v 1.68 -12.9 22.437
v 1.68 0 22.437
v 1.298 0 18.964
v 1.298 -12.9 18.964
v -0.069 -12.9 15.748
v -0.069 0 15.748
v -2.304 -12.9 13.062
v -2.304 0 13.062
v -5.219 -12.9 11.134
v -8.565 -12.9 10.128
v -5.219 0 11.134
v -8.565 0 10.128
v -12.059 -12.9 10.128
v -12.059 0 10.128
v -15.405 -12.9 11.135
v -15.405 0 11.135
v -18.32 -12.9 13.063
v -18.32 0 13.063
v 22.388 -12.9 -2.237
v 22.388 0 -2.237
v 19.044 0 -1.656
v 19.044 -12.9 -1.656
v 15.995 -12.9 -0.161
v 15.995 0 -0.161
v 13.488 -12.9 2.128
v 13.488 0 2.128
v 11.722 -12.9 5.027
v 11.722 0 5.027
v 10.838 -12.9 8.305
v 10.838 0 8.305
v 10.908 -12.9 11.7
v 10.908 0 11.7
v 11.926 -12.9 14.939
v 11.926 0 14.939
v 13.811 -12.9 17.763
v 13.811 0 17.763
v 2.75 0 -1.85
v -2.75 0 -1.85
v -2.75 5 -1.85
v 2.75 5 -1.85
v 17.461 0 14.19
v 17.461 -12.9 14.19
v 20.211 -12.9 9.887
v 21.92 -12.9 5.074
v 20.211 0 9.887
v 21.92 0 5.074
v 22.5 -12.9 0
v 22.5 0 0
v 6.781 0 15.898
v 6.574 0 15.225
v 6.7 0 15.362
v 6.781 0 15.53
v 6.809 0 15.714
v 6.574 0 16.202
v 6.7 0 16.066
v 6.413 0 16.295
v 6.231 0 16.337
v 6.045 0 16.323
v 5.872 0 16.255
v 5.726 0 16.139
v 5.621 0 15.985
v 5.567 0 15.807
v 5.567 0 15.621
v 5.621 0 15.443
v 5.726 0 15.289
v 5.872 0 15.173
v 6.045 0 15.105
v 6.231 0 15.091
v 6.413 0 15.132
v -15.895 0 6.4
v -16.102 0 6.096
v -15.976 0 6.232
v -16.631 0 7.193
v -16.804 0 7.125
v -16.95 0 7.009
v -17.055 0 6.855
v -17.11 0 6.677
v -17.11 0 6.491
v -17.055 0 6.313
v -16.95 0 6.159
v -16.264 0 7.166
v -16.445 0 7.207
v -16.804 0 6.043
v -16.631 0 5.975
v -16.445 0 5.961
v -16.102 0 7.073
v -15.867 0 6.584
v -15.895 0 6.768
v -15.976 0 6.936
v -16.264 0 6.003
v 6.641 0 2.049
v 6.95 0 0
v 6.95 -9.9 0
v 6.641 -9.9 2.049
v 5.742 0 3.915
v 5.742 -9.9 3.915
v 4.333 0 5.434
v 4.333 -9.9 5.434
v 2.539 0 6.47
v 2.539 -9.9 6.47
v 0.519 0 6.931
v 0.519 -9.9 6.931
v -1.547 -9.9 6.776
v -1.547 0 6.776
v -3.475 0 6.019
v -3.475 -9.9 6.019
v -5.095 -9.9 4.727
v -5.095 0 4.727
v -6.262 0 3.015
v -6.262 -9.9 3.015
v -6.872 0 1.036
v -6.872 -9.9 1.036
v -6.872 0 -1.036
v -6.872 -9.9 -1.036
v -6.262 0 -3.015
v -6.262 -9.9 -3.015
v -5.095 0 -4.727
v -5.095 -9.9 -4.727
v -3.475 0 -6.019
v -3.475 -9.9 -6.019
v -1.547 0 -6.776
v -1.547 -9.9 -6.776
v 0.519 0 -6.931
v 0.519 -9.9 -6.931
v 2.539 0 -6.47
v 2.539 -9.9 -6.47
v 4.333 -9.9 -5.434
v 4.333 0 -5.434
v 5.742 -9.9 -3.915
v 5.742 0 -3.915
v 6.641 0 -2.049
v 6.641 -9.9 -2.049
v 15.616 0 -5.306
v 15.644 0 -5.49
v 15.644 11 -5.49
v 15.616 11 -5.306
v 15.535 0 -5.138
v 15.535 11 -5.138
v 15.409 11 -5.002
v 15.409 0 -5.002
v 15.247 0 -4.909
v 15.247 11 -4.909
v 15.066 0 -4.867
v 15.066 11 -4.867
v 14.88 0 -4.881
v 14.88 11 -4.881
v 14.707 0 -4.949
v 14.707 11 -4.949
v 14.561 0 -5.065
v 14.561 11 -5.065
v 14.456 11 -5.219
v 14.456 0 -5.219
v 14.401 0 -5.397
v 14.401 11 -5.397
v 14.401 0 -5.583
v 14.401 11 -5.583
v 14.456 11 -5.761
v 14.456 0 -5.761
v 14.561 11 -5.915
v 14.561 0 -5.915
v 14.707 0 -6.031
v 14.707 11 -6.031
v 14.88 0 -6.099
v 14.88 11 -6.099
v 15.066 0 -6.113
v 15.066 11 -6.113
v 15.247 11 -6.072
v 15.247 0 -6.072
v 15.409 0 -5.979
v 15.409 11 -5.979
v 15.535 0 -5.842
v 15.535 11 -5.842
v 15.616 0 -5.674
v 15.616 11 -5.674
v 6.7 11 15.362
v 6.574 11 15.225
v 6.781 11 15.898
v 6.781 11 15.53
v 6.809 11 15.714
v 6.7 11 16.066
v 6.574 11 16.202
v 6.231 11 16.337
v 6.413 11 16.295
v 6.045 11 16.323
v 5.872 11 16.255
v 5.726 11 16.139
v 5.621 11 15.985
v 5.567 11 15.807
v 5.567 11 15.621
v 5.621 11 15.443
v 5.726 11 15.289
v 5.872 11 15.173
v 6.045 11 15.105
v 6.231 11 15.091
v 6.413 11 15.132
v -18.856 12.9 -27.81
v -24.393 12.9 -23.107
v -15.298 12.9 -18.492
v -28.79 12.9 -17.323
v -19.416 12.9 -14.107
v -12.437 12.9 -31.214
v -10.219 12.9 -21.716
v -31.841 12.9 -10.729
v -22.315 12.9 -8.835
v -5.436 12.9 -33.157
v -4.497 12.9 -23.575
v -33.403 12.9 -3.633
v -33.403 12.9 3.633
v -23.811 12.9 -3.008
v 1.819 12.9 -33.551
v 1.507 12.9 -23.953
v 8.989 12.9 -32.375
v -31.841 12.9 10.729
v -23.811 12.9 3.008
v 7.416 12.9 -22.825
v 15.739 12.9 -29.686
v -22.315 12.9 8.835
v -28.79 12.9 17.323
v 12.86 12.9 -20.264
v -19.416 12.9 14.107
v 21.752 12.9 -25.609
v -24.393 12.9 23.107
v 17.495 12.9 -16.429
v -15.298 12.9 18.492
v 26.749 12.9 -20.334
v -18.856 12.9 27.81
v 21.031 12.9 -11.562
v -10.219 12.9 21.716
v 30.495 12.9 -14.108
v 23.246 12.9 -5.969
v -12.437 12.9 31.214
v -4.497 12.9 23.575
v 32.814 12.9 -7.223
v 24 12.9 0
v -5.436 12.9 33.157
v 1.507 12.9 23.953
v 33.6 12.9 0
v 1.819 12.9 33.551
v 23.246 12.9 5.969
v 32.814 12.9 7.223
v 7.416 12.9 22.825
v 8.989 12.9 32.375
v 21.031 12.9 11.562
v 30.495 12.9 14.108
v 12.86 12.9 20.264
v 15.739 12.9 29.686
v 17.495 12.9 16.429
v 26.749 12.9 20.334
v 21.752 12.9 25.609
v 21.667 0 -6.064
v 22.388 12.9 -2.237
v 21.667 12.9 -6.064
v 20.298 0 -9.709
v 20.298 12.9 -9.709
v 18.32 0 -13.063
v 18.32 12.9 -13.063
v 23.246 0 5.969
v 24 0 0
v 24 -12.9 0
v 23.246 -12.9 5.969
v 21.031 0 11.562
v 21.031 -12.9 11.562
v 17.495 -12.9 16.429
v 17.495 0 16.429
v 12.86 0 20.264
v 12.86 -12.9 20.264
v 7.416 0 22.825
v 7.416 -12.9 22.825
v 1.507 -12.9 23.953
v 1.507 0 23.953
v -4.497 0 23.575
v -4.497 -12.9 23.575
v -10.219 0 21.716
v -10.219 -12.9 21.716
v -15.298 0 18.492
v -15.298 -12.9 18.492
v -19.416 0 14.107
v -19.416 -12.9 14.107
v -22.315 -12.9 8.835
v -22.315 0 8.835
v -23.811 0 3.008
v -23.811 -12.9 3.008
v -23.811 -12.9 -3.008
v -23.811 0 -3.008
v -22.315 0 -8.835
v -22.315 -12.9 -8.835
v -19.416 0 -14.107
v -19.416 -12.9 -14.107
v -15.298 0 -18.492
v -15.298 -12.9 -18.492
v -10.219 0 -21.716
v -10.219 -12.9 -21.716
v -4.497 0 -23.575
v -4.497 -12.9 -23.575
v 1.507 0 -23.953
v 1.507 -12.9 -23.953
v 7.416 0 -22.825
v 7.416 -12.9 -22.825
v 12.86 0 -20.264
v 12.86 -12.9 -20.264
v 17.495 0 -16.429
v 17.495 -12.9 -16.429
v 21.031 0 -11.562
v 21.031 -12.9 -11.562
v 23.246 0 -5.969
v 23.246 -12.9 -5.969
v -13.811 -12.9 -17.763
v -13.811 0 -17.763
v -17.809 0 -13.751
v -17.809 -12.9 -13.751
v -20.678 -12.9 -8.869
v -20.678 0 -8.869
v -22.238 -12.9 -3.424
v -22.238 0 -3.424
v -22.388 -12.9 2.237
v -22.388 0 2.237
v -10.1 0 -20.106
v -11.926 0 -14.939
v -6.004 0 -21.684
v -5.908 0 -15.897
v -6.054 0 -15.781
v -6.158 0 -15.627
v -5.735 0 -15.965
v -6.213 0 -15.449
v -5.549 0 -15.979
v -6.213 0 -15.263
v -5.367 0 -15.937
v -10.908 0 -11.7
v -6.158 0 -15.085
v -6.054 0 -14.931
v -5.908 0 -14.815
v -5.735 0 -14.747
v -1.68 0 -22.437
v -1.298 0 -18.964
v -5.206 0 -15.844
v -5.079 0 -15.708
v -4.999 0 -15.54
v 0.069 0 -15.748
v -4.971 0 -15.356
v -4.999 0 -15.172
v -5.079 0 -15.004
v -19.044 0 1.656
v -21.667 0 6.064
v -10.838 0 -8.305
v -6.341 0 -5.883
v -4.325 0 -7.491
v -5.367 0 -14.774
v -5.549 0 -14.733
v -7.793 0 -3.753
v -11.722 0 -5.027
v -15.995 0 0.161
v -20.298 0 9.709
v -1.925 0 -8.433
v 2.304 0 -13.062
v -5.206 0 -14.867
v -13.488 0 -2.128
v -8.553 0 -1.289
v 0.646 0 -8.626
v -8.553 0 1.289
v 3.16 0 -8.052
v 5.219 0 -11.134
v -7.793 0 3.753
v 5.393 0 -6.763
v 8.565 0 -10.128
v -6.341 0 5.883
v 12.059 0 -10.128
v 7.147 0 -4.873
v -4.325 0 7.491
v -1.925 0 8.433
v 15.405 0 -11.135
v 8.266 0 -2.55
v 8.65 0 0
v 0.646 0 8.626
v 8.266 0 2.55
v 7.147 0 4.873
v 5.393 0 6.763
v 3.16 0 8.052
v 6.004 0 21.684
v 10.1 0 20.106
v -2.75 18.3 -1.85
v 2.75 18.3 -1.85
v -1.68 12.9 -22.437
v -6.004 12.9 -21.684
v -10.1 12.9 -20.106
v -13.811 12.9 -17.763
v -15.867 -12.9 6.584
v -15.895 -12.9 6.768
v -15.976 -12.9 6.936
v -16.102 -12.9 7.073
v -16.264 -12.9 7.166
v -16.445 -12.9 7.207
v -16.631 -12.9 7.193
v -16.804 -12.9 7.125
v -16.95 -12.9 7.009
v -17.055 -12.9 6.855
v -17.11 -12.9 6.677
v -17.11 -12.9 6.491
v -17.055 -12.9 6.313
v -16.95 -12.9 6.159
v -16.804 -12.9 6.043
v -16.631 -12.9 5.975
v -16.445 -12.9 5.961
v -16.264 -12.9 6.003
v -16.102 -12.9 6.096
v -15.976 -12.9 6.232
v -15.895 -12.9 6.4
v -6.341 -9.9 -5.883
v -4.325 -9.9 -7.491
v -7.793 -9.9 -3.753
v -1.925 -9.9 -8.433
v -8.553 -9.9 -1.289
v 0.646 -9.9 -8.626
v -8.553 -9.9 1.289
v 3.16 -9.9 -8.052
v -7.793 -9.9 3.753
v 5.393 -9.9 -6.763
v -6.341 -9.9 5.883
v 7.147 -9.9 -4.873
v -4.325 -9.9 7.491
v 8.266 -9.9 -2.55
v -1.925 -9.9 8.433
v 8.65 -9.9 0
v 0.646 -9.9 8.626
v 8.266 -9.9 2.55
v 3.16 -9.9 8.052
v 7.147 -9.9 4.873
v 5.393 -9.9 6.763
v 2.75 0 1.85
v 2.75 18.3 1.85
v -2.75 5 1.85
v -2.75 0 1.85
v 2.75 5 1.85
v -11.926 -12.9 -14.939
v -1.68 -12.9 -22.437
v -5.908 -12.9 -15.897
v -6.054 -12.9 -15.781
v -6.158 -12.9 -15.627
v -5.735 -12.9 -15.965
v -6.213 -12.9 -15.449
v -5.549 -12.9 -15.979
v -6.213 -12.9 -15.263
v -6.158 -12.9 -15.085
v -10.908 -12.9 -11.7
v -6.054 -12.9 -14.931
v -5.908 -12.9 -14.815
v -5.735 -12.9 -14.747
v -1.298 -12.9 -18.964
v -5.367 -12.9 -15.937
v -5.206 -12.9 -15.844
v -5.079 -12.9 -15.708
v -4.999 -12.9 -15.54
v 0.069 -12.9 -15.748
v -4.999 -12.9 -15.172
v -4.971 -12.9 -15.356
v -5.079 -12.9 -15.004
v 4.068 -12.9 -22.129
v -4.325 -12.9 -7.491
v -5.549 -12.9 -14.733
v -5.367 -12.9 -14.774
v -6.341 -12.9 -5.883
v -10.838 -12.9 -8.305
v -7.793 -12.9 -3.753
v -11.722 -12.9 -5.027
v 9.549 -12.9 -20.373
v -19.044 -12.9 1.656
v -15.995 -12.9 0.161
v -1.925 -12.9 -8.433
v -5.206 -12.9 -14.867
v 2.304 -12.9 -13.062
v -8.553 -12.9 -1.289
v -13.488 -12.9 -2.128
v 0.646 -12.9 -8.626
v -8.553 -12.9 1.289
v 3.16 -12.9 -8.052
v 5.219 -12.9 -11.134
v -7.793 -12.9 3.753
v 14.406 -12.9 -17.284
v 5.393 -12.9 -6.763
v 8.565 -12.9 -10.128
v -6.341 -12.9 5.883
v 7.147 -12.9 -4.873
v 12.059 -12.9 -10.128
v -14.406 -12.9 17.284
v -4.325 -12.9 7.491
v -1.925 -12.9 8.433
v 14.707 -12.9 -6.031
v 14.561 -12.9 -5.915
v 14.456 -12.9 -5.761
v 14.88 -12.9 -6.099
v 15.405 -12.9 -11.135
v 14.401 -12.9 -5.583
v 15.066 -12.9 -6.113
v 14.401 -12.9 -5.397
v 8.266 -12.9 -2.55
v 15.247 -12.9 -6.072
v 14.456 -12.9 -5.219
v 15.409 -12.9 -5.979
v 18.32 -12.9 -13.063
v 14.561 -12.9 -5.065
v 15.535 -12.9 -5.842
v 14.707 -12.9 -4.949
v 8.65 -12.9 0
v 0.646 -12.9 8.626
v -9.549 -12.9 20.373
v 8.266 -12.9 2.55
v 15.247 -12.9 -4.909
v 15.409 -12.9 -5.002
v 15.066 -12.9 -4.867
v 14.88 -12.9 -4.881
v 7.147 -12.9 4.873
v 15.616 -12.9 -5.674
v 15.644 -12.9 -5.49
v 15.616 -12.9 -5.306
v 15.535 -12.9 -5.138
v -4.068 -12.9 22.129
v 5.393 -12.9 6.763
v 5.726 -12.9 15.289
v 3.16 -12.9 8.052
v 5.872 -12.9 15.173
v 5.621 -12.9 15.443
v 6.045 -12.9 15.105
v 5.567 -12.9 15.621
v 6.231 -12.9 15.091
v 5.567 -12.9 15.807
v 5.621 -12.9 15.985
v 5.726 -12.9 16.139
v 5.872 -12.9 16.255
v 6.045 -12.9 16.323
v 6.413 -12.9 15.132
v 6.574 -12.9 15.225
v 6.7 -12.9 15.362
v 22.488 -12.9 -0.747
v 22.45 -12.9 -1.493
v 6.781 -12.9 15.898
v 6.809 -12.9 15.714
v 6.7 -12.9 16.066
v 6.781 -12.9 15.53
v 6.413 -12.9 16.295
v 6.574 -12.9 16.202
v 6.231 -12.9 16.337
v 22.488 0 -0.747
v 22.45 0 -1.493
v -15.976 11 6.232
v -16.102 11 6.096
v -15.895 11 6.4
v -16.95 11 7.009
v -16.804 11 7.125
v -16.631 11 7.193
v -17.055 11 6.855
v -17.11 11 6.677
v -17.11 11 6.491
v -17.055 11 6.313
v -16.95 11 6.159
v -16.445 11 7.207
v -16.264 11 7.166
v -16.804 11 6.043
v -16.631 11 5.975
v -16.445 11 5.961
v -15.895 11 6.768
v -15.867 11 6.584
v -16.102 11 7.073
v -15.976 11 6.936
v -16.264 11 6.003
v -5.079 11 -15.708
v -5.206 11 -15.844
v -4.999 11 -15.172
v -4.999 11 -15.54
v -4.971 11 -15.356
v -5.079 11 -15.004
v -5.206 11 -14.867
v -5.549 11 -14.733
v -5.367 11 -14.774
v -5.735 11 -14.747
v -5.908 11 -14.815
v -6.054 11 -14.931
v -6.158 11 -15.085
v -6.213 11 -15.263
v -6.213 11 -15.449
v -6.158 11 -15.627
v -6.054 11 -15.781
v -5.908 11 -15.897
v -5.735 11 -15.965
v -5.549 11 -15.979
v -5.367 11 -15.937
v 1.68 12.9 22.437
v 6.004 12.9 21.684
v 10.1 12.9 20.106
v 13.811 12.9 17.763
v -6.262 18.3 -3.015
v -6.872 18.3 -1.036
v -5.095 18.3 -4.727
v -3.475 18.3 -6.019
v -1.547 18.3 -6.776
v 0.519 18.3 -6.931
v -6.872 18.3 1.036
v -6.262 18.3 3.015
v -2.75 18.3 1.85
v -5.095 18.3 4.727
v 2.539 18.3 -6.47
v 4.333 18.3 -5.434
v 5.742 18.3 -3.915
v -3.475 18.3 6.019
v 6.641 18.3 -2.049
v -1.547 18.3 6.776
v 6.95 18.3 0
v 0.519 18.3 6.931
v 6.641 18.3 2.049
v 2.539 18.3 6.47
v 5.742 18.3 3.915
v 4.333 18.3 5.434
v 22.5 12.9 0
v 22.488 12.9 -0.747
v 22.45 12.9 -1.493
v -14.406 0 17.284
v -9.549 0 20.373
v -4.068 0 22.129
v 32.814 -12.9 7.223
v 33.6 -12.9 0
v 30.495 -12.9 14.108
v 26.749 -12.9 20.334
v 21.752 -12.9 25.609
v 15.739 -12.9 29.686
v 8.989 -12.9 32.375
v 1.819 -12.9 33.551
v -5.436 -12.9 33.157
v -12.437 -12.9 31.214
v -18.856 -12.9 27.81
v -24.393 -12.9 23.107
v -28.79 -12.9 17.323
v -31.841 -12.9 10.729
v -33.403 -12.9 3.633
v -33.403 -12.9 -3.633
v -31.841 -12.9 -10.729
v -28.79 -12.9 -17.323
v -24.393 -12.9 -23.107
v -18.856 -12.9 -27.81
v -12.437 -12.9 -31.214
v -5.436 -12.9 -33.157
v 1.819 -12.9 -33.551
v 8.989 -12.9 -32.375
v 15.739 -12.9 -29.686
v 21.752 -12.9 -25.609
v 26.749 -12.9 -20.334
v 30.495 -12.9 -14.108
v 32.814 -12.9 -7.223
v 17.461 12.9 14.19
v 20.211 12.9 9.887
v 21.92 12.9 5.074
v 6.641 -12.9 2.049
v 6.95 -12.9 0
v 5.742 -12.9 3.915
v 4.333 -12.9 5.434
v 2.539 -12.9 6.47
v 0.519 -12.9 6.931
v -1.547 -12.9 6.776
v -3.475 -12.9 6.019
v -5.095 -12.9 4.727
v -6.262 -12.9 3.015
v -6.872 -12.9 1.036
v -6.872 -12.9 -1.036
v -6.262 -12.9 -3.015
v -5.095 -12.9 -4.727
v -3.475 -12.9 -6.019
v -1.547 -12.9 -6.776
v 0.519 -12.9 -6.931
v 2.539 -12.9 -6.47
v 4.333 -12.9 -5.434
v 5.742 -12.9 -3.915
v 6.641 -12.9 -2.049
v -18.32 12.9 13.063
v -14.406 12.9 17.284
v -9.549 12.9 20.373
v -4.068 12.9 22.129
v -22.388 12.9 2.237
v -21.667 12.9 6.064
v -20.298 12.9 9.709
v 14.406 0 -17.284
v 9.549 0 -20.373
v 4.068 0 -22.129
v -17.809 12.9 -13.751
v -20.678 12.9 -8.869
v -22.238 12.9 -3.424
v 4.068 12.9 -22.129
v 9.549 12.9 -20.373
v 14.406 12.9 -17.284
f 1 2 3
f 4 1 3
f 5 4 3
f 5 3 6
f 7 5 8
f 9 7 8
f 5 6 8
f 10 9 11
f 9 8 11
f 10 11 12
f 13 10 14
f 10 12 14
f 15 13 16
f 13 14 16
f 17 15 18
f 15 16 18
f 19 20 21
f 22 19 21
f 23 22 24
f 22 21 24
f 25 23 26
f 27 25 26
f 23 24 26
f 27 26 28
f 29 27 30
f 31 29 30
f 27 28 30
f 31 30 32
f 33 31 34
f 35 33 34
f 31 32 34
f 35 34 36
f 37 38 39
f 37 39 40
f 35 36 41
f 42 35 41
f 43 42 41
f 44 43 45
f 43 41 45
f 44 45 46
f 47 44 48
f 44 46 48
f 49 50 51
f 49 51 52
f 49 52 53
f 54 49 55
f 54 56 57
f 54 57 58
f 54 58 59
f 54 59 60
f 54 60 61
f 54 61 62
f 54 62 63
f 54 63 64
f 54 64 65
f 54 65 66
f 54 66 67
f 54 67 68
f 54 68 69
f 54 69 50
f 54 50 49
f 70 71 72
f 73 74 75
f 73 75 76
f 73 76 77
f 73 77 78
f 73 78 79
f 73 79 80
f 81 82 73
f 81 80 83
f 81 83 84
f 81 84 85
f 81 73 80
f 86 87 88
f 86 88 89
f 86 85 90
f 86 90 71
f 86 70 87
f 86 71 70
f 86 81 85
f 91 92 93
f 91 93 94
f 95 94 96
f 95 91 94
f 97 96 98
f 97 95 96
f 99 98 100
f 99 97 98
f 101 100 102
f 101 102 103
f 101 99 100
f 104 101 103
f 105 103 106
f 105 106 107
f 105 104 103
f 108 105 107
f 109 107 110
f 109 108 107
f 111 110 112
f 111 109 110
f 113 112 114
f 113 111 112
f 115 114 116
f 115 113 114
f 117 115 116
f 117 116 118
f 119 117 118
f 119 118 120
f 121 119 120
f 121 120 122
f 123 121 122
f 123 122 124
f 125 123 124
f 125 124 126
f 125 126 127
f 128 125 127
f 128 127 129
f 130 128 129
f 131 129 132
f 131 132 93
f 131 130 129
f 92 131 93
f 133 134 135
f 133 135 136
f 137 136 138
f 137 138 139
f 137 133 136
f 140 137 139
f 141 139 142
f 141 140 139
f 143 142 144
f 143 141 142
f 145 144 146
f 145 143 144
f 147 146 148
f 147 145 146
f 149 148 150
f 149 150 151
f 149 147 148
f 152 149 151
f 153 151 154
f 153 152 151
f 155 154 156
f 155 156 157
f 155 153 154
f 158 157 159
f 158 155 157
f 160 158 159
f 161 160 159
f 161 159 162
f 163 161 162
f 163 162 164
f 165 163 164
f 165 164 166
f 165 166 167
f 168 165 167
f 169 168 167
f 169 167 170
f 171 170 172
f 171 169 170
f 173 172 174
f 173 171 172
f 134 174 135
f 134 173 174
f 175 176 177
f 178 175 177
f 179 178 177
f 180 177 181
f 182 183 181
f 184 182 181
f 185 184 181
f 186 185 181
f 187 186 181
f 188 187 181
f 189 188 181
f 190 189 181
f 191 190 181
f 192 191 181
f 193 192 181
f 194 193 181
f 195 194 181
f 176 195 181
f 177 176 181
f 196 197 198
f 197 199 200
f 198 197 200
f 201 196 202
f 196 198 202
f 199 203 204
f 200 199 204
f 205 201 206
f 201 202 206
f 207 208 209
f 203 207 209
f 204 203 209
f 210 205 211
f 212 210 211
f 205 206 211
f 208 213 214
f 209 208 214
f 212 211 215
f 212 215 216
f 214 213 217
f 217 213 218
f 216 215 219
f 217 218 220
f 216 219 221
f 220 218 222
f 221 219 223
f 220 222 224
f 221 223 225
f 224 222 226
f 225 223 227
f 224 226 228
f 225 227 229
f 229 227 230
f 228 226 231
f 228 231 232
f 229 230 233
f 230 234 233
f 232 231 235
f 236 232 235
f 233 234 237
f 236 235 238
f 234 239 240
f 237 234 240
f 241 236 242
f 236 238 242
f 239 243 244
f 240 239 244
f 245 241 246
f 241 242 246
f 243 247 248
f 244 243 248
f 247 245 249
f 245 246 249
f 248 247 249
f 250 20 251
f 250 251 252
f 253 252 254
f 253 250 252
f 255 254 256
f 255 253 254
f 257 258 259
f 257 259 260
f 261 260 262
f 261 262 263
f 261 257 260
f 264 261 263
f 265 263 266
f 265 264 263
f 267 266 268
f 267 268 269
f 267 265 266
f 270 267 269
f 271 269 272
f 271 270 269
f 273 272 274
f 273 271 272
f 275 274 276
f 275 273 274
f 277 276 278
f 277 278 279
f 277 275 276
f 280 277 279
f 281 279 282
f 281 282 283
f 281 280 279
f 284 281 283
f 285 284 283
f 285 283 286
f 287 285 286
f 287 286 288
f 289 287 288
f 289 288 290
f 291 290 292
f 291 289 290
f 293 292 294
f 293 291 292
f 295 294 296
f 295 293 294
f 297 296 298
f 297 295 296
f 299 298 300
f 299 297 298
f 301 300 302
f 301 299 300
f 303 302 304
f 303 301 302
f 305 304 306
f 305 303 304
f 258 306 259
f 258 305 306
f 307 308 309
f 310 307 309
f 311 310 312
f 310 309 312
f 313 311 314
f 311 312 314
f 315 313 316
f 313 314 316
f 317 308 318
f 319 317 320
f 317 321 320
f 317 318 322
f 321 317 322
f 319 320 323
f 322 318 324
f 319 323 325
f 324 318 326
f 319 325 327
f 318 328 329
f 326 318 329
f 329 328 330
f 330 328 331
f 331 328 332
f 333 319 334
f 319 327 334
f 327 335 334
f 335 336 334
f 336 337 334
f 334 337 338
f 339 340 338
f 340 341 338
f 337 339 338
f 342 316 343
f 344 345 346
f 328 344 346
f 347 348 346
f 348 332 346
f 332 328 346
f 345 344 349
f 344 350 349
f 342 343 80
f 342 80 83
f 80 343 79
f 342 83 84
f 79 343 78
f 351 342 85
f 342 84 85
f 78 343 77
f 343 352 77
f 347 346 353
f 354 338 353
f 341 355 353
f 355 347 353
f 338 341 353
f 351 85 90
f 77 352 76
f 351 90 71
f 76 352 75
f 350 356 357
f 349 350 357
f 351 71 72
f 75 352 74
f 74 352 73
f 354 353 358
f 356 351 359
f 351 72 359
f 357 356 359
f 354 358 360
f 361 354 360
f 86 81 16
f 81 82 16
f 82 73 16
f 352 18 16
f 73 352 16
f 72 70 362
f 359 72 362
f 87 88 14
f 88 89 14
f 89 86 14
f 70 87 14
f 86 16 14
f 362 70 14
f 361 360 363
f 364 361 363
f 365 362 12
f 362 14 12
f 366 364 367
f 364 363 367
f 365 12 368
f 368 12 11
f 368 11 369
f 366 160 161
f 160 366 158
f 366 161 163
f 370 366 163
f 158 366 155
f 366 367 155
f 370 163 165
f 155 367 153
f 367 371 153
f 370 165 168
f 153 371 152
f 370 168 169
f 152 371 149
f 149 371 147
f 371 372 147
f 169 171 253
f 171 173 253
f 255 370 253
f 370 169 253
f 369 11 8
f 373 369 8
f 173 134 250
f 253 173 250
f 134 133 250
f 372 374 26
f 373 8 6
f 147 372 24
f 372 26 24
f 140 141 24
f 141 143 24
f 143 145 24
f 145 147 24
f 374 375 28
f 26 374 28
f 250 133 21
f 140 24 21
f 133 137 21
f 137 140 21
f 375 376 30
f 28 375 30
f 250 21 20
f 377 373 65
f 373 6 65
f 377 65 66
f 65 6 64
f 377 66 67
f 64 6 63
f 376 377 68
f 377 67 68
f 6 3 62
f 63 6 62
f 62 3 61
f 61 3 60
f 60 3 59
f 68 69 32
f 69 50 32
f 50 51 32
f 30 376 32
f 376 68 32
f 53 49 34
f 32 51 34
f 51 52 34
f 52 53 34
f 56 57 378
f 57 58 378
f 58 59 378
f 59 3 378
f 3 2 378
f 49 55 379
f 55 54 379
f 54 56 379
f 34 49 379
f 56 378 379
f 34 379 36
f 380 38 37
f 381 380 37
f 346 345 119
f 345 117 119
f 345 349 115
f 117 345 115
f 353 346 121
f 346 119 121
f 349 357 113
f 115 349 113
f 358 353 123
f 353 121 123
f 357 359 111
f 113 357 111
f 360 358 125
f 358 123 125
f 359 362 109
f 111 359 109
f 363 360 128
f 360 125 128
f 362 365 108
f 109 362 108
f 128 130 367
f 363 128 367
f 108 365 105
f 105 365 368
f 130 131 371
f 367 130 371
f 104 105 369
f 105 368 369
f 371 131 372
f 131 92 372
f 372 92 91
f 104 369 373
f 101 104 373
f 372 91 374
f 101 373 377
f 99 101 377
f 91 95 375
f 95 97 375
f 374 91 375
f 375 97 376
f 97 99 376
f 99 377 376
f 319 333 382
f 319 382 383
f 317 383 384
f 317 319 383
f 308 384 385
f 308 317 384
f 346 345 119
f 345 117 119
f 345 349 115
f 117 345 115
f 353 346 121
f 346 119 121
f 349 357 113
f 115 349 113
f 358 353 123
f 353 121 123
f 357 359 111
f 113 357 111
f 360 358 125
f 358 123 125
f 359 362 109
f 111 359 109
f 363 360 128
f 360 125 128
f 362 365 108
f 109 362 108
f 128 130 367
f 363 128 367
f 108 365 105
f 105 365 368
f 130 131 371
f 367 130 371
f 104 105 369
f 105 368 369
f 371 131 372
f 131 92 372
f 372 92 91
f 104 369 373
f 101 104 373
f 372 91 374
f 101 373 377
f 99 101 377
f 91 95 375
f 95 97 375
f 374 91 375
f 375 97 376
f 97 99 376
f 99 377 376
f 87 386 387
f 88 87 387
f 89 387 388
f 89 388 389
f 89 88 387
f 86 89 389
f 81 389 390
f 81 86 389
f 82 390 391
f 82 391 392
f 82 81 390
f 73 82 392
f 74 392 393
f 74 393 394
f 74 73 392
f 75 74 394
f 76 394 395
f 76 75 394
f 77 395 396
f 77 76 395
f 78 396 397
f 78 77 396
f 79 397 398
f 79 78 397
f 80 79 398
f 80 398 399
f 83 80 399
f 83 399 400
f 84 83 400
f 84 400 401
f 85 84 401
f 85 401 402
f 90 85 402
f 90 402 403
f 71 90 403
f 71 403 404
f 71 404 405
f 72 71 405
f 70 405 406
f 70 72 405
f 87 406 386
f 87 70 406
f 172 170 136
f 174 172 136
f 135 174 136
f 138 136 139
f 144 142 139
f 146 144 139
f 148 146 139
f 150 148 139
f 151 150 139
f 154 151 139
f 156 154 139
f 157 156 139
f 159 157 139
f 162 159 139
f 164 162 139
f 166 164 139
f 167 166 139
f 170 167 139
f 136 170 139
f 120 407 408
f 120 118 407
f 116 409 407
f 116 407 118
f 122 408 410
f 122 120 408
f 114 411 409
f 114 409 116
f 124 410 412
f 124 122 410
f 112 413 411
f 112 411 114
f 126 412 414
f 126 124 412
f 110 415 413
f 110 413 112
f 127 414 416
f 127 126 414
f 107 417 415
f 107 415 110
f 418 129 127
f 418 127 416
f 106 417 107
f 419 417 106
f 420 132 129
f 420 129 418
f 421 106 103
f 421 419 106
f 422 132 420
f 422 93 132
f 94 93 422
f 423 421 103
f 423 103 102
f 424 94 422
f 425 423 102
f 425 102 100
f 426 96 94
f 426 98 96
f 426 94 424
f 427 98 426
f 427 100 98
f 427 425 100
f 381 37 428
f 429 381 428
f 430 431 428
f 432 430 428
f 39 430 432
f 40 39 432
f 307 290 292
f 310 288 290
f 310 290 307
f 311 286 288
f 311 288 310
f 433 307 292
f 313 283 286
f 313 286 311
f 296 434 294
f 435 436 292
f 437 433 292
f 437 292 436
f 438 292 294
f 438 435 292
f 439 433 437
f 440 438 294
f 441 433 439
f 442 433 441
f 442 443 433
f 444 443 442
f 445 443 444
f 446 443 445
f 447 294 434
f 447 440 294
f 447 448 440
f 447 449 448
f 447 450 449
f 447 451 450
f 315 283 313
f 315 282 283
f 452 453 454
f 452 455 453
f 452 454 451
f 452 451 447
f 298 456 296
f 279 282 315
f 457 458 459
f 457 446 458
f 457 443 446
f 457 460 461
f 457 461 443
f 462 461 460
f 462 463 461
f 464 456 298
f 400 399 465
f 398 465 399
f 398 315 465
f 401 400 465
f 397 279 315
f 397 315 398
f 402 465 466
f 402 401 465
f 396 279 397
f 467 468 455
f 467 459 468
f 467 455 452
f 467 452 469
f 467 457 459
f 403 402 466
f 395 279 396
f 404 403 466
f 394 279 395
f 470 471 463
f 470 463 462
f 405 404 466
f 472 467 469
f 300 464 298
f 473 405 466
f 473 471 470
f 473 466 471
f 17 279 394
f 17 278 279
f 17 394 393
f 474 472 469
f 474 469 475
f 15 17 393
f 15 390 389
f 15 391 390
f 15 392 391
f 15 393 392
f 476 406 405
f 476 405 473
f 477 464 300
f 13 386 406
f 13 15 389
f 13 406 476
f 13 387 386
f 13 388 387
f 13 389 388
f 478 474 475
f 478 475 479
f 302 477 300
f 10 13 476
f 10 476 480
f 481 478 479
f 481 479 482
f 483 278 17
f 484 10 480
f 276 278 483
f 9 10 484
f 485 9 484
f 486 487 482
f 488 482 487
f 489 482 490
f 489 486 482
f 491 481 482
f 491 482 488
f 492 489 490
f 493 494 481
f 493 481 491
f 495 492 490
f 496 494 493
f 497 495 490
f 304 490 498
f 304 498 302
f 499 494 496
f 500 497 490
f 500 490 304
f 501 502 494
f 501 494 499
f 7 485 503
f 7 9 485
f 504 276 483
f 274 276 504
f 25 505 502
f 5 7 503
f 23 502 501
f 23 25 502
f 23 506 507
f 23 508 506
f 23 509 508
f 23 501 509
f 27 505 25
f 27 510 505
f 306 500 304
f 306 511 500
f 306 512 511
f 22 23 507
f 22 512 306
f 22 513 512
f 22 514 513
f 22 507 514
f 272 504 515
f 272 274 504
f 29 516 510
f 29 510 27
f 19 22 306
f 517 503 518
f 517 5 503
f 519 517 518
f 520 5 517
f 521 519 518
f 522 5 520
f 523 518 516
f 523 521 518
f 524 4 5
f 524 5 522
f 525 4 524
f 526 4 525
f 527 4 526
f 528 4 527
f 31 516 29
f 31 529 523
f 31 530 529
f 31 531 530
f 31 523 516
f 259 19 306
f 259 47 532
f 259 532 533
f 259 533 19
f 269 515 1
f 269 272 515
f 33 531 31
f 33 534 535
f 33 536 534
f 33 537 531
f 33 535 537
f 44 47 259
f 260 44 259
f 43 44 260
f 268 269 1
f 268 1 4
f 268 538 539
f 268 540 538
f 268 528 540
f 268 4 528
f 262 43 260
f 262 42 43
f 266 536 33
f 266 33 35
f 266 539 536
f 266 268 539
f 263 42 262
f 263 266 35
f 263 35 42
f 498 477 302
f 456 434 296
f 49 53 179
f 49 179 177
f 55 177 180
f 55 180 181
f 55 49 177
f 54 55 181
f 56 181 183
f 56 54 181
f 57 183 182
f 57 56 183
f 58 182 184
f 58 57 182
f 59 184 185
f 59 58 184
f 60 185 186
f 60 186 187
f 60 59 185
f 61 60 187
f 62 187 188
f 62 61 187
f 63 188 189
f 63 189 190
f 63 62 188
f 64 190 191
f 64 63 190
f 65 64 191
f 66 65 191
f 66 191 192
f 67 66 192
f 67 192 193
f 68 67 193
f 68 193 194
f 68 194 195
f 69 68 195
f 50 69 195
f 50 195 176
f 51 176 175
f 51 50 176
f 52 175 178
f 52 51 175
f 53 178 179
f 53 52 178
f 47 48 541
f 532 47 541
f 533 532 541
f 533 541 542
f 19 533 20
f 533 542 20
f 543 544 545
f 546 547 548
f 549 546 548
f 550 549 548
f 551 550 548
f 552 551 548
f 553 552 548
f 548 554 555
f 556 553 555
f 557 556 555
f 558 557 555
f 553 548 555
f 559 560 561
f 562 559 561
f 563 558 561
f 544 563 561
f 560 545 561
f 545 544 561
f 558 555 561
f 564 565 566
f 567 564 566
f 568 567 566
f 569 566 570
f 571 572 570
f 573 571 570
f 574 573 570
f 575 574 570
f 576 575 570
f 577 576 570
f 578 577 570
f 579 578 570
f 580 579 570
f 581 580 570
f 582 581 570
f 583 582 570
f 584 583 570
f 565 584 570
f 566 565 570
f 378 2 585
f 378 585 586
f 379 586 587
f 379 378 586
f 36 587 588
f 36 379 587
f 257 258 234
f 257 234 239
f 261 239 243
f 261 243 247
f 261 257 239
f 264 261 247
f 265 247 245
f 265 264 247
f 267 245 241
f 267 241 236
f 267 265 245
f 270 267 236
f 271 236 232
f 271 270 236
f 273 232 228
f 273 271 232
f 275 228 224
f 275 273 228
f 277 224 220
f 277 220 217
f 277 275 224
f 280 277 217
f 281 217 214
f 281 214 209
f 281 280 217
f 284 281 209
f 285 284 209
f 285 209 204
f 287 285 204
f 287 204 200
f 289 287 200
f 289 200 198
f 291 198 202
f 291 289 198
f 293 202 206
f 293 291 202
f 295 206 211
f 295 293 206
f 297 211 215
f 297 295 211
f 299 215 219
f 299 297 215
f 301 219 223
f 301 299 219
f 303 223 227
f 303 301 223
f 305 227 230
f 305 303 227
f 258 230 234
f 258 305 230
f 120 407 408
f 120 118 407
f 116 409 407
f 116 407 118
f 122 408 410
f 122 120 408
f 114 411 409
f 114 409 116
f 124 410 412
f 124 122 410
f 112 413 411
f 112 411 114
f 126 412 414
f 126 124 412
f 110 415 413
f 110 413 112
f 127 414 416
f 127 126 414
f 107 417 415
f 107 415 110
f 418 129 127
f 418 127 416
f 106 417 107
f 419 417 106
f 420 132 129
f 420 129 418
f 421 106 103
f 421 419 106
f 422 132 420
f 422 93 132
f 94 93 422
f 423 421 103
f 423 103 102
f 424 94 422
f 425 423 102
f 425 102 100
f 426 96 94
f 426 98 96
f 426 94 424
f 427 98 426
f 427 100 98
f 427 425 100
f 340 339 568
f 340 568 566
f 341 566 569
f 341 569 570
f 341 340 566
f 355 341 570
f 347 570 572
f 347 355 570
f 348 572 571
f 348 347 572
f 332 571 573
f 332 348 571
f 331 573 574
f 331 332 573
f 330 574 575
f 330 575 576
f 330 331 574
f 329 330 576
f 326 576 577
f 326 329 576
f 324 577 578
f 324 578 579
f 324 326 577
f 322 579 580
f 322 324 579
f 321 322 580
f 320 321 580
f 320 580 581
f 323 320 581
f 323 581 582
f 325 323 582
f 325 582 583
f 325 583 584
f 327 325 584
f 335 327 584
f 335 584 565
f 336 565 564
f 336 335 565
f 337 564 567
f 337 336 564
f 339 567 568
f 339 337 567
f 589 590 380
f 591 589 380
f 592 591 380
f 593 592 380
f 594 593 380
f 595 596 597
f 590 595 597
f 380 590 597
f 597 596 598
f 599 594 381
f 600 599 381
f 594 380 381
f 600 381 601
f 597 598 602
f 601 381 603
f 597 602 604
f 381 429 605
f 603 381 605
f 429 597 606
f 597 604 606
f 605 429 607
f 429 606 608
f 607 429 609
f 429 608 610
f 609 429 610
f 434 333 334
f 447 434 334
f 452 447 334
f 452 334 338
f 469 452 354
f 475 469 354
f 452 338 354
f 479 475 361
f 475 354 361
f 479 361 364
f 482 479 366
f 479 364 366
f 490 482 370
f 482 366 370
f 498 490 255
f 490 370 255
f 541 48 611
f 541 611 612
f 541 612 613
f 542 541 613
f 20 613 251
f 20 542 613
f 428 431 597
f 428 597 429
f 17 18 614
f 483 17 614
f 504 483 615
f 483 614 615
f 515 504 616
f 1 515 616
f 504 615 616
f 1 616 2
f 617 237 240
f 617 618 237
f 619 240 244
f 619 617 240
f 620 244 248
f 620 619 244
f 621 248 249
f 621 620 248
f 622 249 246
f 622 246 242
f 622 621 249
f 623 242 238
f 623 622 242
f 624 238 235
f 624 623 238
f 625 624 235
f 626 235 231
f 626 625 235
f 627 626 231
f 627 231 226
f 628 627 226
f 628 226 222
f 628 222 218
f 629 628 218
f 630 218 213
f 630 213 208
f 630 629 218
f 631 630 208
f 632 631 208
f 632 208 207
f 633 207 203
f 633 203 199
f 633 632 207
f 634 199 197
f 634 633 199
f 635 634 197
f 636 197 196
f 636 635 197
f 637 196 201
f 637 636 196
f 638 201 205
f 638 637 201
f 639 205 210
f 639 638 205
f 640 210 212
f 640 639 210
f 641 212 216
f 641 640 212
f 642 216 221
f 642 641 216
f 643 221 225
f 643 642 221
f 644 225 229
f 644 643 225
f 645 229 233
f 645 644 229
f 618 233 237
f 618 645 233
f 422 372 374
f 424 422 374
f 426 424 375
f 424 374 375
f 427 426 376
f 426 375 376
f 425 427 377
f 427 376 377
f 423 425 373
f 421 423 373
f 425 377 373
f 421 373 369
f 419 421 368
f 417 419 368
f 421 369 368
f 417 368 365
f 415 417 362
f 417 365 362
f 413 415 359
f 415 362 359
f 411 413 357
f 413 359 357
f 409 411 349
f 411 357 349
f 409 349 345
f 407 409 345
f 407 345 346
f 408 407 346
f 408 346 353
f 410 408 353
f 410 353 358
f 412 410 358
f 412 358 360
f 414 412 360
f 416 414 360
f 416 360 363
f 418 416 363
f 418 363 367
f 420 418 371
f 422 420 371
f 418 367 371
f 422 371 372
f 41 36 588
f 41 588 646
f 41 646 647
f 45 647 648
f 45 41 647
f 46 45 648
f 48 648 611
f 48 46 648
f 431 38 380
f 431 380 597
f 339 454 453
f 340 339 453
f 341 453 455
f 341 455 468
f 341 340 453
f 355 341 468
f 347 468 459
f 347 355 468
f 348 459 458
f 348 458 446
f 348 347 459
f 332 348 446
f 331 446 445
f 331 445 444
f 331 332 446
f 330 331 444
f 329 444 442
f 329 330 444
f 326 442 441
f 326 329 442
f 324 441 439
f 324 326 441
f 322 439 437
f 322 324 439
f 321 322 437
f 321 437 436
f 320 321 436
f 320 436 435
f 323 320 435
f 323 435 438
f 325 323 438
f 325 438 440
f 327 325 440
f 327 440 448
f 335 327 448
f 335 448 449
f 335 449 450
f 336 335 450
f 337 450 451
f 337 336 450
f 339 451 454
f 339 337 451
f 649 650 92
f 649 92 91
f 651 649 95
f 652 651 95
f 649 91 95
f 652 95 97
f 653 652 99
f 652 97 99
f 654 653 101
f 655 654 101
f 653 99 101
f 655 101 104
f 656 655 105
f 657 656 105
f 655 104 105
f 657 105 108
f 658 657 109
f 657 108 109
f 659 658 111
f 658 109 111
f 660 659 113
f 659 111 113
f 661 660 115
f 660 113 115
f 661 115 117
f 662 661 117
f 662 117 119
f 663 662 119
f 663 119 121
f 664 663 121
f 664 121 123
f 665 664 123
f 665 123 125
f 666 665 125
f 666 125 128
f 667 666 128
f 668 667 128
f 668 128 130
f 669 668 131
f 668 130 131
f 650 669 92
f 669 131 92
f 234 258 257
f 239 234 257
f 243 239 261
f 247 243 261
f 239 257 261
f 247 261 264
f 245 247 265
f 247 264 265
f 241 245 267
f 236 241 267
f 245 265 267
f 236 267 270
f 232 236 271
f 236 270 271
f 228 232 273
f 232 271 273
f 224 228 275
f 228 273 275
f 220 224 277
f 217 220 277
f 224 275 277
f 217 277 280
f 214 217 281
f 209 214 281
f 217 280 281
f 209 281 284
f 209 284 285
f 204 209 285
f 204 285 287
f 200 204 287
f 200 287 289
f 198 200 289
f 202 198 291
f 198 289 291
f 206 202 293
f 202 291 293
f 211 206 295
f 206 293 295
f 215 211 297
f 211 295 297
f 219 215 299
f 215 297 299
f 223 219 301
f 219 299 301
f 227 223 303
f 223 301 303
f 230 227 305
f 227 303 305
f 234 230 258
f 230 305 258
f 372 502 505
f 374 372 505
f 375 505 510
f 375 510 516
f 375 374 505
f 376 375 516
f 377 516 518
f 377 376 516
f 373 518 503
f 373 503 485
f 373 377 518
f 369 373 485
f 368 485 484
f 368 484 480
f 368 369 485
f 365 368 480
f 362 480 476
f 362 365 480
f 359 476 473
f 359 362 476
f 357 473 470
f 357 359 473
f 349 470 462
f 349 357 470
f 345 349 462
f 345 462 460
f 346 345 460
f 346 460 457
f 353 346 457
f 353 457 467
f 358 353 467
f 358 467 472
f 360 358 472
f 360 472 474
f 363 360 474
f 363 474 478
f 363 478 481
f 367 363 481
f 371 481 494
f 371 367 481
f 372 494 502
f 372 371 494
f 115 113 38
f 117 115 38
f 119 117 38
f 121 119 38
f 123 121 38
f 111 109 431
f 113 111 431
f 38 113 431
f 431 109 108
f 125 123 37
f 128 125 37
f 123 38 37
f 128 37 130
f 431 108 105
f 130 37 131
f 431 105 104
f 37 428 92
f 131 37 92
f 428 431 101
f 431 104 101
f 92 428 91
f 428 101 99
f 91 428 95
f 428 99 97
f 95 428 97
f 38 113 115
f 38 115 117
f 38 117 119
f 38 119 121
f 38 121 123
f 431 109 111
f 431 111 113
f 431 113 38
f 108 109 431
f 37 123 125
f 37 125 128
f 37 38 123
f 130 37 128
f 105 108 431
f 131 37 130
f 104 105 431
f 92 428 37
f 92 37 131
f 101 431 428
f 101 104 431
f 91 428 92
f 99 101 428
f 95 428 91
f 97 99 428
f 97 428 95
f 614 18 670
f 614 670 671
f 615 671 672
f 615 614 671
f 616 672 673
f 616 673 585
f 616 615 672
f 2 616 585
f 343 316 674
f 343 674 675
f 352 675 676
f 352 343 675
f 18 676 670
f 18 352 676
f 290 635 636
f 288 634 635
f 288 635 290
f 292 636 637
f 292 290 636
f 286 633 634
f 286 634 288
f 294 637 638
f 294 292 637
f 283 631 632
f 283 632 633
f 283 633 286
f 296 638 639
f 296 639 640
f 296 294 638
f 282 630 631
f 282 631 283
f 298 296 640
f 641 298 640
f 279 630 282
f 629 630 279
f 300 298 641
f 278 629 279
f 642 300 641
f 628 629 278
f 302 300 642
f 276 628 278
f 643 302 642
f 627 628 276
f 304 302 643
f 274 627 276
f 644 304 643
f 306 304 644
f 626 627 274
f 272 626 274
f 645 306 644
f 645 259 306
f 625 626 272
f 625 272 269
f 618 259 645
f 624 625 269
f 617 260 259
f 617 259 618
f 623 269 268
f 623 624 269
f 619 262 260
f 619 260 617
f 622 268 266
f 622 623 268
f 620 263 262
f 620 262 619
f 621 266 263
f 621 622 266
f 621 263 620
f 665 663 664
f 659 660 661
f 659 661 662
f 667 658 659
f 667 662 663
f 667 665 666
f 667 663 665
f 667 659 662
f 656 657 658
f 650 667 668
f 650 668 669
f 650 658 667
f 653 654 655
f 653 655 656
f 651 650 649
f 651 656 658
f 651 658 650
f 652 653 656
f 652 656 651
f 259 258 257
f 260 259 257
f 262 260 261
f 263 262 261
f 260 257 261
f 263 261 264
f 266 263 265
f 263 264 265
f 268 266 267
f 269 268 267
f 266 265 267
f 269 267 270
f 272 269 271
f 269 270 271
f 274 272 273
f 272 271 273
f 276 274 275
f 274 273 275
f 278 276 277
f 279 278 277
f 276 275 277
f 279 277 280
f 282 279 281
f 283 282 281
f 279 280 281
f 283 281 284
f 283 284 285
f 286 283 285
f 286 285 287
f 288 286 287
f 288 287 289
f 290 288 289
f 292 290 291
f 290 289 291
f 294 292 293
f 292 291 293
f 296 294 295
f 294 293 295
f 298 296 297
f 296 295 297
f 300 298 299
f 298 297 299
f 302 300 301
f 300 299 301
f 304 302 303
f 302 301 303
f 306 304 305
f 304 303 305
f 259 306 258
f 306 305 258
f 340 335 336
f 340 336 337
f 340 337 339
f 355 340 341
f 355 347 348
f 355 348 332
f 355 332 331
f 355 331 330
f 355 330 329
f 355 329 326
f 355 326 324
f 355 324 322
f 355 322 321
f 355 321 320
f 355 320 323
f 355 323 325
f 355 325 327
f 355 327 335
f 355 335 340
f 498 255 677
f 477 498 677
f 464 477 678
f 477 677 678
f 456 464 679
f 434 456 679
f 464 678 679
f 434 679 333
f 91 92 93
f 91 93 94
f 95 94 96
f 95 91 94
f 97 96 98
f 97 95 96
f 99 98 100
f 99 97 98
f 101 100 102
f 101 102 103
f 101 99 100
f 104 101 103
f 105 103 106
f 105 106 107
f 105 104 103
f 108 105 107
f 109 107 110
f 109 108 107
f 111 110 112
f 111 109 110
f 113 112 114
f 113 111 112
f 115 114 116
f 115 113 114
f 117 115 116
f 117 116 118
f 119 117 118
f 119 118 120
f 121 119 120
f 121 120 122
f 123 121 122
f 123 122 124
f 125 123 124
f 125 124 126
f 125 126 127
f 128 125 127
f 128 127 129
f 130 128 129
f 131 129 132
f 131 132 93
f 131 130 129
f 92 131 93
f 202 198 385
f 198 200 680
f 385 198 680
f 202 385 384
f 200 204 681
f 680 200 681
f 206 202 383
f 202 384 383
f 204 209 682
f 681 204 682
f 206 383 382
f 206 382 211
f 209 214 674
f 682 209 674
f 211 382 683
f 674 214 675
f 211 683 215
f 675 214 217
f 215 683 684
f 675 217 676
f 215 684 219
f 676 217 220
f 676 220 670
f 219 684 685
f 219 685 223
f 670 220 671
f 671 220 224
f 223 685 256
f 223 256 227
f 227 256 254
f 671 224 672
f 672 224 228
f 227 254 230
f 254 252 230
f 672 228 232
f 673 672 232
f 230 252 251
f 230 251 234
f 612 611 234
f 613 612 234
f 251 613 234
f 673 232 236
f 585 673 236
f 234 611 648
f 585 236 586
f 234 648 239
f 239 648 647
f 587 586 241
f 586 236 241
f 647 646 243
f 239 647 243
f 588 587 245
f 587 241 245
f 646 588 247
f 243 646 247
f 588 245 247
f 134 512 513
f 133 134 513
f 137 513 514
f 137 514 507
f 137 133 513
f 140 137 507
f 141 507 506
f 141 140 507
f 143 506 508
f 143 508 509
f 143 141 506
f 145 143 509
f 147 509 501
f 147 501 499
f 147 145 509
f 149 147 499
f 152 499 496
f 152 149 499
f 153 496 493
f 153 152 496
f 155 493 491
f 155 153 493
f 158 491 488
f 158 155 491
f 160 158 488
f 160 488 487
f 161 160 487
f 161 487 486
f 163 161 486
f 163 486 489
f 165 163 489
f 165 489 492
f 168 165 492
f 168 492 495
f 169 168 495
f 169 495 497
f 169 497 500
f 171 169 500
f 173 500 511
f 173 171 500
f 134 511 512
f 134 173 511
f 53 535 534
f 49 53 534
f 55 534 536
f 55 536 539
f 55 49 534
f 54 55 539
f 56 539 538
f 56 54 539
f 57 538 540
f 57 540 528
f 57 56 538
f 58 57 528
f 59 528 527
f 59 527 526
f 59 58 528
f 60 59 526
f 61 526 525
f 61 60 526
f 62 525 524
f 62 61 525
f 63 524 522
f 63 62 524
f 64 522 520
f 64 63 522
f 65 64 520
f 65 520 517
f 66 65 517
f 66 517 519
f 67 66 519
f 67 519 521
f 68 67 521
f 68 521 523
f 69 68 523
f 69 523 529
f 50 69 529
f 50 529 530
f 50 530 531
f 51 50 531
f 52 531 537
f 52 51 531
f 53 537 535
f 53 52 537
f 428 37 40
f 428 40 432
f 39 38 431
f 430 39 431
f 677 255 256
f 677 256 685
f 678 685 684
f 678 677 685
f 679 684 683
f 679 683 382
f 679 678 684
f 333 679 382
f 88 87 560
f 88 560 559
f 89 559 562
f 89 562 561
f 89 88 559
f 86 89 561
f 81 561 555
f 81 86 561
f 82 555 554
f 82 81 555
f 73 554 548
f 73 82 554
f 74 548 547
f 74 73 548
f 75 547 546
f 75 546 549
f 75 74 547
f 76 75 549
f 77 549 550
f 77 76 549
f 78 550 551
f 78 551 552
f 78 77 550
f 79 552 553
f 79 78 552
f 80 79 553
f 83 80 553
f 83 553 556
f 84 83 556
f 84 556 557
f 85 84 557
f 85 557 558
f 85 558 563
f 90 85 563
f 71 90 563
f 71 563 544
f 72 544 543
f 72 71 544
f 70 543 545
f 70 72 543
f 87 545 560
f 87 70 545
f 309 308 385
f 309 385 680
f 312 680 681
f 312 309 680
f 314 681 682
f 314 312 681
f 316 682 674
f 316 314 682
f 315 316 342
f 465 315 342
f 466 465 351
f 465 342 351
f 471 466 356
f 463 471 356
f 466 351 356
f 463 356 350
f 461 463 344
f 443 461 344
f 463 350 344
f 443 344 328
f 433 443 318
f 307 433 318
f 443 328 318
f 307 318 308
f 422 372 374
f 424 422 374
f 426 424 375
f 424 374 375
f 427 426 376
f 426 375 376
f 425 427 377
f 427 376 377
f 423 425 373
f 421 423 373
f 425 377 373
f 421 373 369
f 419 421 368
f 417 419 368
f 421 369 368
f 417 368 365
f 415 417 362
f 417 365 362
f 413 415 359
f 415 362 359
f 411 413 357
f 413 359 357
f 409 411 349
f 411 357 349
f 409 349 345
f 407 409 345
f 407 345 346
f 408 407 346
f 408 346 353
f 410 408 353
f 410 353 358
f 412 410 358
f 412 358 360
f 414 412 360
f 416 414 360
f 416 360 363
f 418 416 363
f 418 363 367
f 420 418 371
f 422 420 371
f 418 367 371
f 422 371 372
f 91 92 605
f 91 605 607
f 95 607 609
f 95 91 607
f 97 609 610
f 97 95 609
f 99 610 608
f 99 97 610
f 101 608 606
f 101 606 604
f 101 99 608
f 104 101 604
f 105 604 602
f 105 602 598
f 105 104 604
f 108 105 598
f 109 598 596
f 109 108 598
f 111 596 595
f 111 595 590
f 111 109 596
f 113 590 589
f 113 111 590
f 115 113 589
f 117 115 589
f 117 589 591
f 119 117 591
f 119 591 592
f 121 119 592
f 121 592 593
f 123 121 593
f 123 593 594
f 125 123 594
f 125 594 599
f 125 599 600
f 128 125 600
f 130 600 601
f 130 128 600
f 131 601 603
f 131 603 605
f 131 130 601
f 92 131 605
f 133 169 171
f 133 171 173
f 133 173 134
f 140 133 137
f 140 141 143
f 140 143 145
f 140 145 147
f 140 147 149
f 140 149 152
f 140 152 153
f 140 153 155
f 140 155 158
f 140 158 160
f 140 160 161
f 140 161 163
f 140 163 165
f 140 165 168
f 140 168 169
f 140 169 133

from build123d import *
from build123d import SkipClean  # not in build123d's __all__

# Parameters (mm, degrees)
F0_R      = 24
F0_R_2    = 0.6247236377
F0_R_3    = 8.65
F1_DEPTH  = 12.9
F2_DEPTH  = 12.9
F0_R_4    = 6.95
F0_W      = 5.5
F0_H      = 3.7
F3_DEPTH  = 12.9
F4_DEPTH  = 9.9
F5_DEPTH  = 9.9
F6_DEPTH  = 18.3
F7_DEPTH  = 5
F8_R      = 33.6
F8_R_2    = 24
F9_DEPTH  = 12.9
F10_DEPTH = 12.9
F11_DEPTH = 11


# Not quite as in the source:
# - a feature names something its author has since deleted; it is built from what else it names


with BuildPart() as f1:
    # F0 (on Front) → F1 (new body)
    with BuildSketch(Plane.XZ):
        Circle(F0_R)
        with BuildLine():
            ThreePointArc((13.8107888925, 17.76266056), (20.211293255, 9.887043287), (22.5, 0))
            ThreePointArc((22.5, 0), (22.4721042456, -1.1200583811), (22.3884861532, -2.23733944))
            ThreePointArc((22.3884861532, -2.23733944), (21.0615108713, -7.9159812923), (18.3197080891, -13.0628593934))
            ThreePointArc((18.3197080891, -13.0628593934), (9.5491868643, -20.3730957449), (-1.6802919109, -22.4371704788))
            ThreePointArc((-1.6802919109, -22.4371704788), (-8.0904979364, -20.9950909296), (-13.8107888925, -17.76266056))
            ThreePointArc((-13.8107888925, -17.76266056), (-20.6784157627, -8.8686595122), (-22.3884861532, 2.23733944))
            ThreePointArc((-22.3884861532, 2.23733944), (-21.0615108713, 7.9159812923), (-18.3197080891, 13.0628593934))
            ThreePointArc((-18.3197080891, 13.0628593934), (-9.5491868643, 20.3730957449), (1.6802919109, 22.4371704788))
            ThreePointArc((1.6802919109, 22.4371704788), (8.0904979364, 20.9950909296), (13.8107888925, 17.76266056))
        make_face(mode=Mode.SUBTRACT)
        with BuildLine():
            ThreePointArc((22.3884861532, -2.23733944), (11.7216927981, 5.0272566102), (13.8107888925, 17.76266056))
            ThreePointArc((13.8107888925, 17.76266056), (8.0904979364, 20.9950909296), (1.6802919109, 22.4371704788))
            ThreePointArc((1.6802919109, 22.4371704788), (-5.218842533, 11.134348936), (-18.3197080891, 13.0628593934))
            ThreePointArc((-18.3197080891, 13.0628593934), (-21.0615108713, 7.9159812923), (-22.3884861532, 2.23733944))
            ThreePointArc((-22.3884861532, 2.23733944), (-11.7216927981, -5.0272566102), (-13.8107888925, -17.76266056))
            ThreePointArc((-13.8107888925, -17.76266056), (-8.0904979364, -20.9950909296), (-1.6802919109, -22.4371704788))
            ThreePointArc((-1.6802919109, -22.4371704788), (5.218842533, -11.134348936), (18.3197080891, -13.0628593934))
            ThreePointArc((18.3197080891, -13.0628593934), (21.0615108713, -7.9159812923), (22.3884861532, -2.23733944))
        make_face()
        with Locations((-5.5955685675, -15.3557388112)):
            Circle(F0_R_2, mode=Mode.SUBTRACT)
        with Locations((15.0192249566, -5.4900874384)):
            Circle(F0_R_2, mode=Mode.SUBTRACT)
        with Locations((-16.4919588715, 6.584291812)):
            Circle(F0_R_2, mode=Mode.SUBTRACT)
        Circle(F0_R_3, mode=Mode.SUBTRACT)
        with Locations((6.1843143776, 15.7137010247)):
            Circle(F0_R_2, mode=Mode.SUBTRACT)
    extrude(amount=F1_DEPTH)

    # F0 (on Front) → F2 (join)
    with BuildSketch(Plane.XZ):
        Circle(F0_R)
        with BuildLine():
            ThreePointArc((13.8107888925, 17.76266056), (20.211293255, 9.887043287), (22.5, 0))
            ThreePointArc((22.5, 0), (22.4721042456, -1.1200583811), (22.3884861532, -2.23733944))
            ThreePointArc((22.3884861532, -2.23733944), (21.0615108713, -7.9159812923), (18.3197080891, -13.0628593934))
            ThreePointArc((18.3197080891, -13.0628593934), (9.5491868643, -20.3730957449), (-1.6802919109, -22.4371704788))
            ThreePointArc((-1.6802919109, -22.4371704788), (-8.0904979364, -20.9950909296), (-13.8107888925, -17.76266056))
            ThreePointArc((-13.8107888925, -17.76266056), (-20.6784157627, -8.8686595122), (-22.3884861532, 2.23733944))
            ThreePointArc((-22.3884861532, 2.23733944), (-21.0615108713, 7.9159812923), (-18.3197080891, 13.0628593934))
            ThreePointArc((-18.3197080891, 13.0628593934), (-9.5491868643, 20.3730957449), (1.6802919109, 22.4371704788))
            ThreePointArc((1.6802919109, 22.4371704788), (8.0904979364, 20.9950909296), (13.8107888925, 17.76266056))
        make_face(mode=Mode.SUBTRACT)
    with SkipClean():  # cleaning this boolean's faces spoils the solid; the shape is the same uncleaned
        extrude(amount=-F2_DEPTH)


with BuildPart() as f3:
    # F0 (on Front) → F3 (new body)
    with BuildSketch(Plane.XZ):
        Circle(F0_R_4)
        Rectangle(F0_W, F0_H, mode=Mode.SUBTRACT)
        Rectangle(F0_W, F0_H)
    extrude(amount=F3_DEPTH)

    # F0 (on Front) → F7 (join)
    with BuildSketch(Plane.XZ):
        Rectangle(F0_W, F0_H)
    extrude(amount=-F7_DEPTH)


with BuildPart() as f4:
    # F0 (on Front) → F4 (new body)
    with BuildSketch(Plane.XZ):
        Circle(F0_R_3)
        Circle(F0_R_4, mode=Mode.SUBTRACT)
    extrude(amount=F4_DEPTH)


with BuildPart() as f5:
    # F0 (on Front) → F5 (new body)
    with BuildSketch(Plane.XZ):
        Circle(F0_R_3)
        Circle(F0_R_4, mode=Mode.SUBTRACT)
    extrude(amount=F5_DEPTH)


with BuildPart() as f6:
    # F0 (on Front) → F6 (new body)
    with BuildSketch(Plane.XZ):
        Circle(F0_R_4)
        Rectangle(F0_W, F0_H, mode=Mode.SUBTRACT)
    extrude(amount=-F6_DEPTH)


with BuildPart() as f9:
    # F8 (on Front) → F9 (new body)
    with BuildSketch(Plane.XZ):
        Circle(F8_R)
        Circle(F8_R_2, mode=Mode.SUBTRACT)
    extrude(amount=F9_DEPTH)

    # F10 (add): a face of the model
    f10_faces = [f9.faces().sort_by_distance(p)[0] for p in [
        (-32.6496484861, 0, 0),
    ]]
    extrude(f10_faces, amount=F10_DEPTH)


with BuildPart() as f11:
    # F0 (on Front) → F11 (new body)
    with BuildSketch(Plane.XZ):
        with Locations((6.1843143776, 15.7137010247)):
            Circle(F0_R_2)
    extrude(amount=-F11_DEPTH)


with BuildPart() as f11b:
    # F0 (on Front) → F11, piece 2 (new body)
    with BuildSketch(Plane.XZ):
        with Locations((-16.4919588715, 6.584291812)):
            Circle(F0_R_2)
    extrude(amount=-F11_DEPTH)


with BuildPart() as f11c:
    # F0 (on Front) → F11, piece 3 (new body)
    with BuildSketch(Plane.XZ):
        with Locations((15.0192249566, -5.4900874384)):
            Circle(F0_R_2)
    extrude(amount=-F11_DEPTH)


with BuildPart() as f11d:
    # F0 (on Front) → F11, piece 4 (new body)
    with BuildSketch(Plane.XZ):
        with Locations((-5.5955685675, -15.3557388112)):
            Circle(F0_R_2)
    extrude(amount=-F11_DEPTH)


solid = Compound([f1.part, f3.part, f4.part, f5.part, f6.part, f9.part, f11.part, f11b.part, f11c.part, f11d.part])
